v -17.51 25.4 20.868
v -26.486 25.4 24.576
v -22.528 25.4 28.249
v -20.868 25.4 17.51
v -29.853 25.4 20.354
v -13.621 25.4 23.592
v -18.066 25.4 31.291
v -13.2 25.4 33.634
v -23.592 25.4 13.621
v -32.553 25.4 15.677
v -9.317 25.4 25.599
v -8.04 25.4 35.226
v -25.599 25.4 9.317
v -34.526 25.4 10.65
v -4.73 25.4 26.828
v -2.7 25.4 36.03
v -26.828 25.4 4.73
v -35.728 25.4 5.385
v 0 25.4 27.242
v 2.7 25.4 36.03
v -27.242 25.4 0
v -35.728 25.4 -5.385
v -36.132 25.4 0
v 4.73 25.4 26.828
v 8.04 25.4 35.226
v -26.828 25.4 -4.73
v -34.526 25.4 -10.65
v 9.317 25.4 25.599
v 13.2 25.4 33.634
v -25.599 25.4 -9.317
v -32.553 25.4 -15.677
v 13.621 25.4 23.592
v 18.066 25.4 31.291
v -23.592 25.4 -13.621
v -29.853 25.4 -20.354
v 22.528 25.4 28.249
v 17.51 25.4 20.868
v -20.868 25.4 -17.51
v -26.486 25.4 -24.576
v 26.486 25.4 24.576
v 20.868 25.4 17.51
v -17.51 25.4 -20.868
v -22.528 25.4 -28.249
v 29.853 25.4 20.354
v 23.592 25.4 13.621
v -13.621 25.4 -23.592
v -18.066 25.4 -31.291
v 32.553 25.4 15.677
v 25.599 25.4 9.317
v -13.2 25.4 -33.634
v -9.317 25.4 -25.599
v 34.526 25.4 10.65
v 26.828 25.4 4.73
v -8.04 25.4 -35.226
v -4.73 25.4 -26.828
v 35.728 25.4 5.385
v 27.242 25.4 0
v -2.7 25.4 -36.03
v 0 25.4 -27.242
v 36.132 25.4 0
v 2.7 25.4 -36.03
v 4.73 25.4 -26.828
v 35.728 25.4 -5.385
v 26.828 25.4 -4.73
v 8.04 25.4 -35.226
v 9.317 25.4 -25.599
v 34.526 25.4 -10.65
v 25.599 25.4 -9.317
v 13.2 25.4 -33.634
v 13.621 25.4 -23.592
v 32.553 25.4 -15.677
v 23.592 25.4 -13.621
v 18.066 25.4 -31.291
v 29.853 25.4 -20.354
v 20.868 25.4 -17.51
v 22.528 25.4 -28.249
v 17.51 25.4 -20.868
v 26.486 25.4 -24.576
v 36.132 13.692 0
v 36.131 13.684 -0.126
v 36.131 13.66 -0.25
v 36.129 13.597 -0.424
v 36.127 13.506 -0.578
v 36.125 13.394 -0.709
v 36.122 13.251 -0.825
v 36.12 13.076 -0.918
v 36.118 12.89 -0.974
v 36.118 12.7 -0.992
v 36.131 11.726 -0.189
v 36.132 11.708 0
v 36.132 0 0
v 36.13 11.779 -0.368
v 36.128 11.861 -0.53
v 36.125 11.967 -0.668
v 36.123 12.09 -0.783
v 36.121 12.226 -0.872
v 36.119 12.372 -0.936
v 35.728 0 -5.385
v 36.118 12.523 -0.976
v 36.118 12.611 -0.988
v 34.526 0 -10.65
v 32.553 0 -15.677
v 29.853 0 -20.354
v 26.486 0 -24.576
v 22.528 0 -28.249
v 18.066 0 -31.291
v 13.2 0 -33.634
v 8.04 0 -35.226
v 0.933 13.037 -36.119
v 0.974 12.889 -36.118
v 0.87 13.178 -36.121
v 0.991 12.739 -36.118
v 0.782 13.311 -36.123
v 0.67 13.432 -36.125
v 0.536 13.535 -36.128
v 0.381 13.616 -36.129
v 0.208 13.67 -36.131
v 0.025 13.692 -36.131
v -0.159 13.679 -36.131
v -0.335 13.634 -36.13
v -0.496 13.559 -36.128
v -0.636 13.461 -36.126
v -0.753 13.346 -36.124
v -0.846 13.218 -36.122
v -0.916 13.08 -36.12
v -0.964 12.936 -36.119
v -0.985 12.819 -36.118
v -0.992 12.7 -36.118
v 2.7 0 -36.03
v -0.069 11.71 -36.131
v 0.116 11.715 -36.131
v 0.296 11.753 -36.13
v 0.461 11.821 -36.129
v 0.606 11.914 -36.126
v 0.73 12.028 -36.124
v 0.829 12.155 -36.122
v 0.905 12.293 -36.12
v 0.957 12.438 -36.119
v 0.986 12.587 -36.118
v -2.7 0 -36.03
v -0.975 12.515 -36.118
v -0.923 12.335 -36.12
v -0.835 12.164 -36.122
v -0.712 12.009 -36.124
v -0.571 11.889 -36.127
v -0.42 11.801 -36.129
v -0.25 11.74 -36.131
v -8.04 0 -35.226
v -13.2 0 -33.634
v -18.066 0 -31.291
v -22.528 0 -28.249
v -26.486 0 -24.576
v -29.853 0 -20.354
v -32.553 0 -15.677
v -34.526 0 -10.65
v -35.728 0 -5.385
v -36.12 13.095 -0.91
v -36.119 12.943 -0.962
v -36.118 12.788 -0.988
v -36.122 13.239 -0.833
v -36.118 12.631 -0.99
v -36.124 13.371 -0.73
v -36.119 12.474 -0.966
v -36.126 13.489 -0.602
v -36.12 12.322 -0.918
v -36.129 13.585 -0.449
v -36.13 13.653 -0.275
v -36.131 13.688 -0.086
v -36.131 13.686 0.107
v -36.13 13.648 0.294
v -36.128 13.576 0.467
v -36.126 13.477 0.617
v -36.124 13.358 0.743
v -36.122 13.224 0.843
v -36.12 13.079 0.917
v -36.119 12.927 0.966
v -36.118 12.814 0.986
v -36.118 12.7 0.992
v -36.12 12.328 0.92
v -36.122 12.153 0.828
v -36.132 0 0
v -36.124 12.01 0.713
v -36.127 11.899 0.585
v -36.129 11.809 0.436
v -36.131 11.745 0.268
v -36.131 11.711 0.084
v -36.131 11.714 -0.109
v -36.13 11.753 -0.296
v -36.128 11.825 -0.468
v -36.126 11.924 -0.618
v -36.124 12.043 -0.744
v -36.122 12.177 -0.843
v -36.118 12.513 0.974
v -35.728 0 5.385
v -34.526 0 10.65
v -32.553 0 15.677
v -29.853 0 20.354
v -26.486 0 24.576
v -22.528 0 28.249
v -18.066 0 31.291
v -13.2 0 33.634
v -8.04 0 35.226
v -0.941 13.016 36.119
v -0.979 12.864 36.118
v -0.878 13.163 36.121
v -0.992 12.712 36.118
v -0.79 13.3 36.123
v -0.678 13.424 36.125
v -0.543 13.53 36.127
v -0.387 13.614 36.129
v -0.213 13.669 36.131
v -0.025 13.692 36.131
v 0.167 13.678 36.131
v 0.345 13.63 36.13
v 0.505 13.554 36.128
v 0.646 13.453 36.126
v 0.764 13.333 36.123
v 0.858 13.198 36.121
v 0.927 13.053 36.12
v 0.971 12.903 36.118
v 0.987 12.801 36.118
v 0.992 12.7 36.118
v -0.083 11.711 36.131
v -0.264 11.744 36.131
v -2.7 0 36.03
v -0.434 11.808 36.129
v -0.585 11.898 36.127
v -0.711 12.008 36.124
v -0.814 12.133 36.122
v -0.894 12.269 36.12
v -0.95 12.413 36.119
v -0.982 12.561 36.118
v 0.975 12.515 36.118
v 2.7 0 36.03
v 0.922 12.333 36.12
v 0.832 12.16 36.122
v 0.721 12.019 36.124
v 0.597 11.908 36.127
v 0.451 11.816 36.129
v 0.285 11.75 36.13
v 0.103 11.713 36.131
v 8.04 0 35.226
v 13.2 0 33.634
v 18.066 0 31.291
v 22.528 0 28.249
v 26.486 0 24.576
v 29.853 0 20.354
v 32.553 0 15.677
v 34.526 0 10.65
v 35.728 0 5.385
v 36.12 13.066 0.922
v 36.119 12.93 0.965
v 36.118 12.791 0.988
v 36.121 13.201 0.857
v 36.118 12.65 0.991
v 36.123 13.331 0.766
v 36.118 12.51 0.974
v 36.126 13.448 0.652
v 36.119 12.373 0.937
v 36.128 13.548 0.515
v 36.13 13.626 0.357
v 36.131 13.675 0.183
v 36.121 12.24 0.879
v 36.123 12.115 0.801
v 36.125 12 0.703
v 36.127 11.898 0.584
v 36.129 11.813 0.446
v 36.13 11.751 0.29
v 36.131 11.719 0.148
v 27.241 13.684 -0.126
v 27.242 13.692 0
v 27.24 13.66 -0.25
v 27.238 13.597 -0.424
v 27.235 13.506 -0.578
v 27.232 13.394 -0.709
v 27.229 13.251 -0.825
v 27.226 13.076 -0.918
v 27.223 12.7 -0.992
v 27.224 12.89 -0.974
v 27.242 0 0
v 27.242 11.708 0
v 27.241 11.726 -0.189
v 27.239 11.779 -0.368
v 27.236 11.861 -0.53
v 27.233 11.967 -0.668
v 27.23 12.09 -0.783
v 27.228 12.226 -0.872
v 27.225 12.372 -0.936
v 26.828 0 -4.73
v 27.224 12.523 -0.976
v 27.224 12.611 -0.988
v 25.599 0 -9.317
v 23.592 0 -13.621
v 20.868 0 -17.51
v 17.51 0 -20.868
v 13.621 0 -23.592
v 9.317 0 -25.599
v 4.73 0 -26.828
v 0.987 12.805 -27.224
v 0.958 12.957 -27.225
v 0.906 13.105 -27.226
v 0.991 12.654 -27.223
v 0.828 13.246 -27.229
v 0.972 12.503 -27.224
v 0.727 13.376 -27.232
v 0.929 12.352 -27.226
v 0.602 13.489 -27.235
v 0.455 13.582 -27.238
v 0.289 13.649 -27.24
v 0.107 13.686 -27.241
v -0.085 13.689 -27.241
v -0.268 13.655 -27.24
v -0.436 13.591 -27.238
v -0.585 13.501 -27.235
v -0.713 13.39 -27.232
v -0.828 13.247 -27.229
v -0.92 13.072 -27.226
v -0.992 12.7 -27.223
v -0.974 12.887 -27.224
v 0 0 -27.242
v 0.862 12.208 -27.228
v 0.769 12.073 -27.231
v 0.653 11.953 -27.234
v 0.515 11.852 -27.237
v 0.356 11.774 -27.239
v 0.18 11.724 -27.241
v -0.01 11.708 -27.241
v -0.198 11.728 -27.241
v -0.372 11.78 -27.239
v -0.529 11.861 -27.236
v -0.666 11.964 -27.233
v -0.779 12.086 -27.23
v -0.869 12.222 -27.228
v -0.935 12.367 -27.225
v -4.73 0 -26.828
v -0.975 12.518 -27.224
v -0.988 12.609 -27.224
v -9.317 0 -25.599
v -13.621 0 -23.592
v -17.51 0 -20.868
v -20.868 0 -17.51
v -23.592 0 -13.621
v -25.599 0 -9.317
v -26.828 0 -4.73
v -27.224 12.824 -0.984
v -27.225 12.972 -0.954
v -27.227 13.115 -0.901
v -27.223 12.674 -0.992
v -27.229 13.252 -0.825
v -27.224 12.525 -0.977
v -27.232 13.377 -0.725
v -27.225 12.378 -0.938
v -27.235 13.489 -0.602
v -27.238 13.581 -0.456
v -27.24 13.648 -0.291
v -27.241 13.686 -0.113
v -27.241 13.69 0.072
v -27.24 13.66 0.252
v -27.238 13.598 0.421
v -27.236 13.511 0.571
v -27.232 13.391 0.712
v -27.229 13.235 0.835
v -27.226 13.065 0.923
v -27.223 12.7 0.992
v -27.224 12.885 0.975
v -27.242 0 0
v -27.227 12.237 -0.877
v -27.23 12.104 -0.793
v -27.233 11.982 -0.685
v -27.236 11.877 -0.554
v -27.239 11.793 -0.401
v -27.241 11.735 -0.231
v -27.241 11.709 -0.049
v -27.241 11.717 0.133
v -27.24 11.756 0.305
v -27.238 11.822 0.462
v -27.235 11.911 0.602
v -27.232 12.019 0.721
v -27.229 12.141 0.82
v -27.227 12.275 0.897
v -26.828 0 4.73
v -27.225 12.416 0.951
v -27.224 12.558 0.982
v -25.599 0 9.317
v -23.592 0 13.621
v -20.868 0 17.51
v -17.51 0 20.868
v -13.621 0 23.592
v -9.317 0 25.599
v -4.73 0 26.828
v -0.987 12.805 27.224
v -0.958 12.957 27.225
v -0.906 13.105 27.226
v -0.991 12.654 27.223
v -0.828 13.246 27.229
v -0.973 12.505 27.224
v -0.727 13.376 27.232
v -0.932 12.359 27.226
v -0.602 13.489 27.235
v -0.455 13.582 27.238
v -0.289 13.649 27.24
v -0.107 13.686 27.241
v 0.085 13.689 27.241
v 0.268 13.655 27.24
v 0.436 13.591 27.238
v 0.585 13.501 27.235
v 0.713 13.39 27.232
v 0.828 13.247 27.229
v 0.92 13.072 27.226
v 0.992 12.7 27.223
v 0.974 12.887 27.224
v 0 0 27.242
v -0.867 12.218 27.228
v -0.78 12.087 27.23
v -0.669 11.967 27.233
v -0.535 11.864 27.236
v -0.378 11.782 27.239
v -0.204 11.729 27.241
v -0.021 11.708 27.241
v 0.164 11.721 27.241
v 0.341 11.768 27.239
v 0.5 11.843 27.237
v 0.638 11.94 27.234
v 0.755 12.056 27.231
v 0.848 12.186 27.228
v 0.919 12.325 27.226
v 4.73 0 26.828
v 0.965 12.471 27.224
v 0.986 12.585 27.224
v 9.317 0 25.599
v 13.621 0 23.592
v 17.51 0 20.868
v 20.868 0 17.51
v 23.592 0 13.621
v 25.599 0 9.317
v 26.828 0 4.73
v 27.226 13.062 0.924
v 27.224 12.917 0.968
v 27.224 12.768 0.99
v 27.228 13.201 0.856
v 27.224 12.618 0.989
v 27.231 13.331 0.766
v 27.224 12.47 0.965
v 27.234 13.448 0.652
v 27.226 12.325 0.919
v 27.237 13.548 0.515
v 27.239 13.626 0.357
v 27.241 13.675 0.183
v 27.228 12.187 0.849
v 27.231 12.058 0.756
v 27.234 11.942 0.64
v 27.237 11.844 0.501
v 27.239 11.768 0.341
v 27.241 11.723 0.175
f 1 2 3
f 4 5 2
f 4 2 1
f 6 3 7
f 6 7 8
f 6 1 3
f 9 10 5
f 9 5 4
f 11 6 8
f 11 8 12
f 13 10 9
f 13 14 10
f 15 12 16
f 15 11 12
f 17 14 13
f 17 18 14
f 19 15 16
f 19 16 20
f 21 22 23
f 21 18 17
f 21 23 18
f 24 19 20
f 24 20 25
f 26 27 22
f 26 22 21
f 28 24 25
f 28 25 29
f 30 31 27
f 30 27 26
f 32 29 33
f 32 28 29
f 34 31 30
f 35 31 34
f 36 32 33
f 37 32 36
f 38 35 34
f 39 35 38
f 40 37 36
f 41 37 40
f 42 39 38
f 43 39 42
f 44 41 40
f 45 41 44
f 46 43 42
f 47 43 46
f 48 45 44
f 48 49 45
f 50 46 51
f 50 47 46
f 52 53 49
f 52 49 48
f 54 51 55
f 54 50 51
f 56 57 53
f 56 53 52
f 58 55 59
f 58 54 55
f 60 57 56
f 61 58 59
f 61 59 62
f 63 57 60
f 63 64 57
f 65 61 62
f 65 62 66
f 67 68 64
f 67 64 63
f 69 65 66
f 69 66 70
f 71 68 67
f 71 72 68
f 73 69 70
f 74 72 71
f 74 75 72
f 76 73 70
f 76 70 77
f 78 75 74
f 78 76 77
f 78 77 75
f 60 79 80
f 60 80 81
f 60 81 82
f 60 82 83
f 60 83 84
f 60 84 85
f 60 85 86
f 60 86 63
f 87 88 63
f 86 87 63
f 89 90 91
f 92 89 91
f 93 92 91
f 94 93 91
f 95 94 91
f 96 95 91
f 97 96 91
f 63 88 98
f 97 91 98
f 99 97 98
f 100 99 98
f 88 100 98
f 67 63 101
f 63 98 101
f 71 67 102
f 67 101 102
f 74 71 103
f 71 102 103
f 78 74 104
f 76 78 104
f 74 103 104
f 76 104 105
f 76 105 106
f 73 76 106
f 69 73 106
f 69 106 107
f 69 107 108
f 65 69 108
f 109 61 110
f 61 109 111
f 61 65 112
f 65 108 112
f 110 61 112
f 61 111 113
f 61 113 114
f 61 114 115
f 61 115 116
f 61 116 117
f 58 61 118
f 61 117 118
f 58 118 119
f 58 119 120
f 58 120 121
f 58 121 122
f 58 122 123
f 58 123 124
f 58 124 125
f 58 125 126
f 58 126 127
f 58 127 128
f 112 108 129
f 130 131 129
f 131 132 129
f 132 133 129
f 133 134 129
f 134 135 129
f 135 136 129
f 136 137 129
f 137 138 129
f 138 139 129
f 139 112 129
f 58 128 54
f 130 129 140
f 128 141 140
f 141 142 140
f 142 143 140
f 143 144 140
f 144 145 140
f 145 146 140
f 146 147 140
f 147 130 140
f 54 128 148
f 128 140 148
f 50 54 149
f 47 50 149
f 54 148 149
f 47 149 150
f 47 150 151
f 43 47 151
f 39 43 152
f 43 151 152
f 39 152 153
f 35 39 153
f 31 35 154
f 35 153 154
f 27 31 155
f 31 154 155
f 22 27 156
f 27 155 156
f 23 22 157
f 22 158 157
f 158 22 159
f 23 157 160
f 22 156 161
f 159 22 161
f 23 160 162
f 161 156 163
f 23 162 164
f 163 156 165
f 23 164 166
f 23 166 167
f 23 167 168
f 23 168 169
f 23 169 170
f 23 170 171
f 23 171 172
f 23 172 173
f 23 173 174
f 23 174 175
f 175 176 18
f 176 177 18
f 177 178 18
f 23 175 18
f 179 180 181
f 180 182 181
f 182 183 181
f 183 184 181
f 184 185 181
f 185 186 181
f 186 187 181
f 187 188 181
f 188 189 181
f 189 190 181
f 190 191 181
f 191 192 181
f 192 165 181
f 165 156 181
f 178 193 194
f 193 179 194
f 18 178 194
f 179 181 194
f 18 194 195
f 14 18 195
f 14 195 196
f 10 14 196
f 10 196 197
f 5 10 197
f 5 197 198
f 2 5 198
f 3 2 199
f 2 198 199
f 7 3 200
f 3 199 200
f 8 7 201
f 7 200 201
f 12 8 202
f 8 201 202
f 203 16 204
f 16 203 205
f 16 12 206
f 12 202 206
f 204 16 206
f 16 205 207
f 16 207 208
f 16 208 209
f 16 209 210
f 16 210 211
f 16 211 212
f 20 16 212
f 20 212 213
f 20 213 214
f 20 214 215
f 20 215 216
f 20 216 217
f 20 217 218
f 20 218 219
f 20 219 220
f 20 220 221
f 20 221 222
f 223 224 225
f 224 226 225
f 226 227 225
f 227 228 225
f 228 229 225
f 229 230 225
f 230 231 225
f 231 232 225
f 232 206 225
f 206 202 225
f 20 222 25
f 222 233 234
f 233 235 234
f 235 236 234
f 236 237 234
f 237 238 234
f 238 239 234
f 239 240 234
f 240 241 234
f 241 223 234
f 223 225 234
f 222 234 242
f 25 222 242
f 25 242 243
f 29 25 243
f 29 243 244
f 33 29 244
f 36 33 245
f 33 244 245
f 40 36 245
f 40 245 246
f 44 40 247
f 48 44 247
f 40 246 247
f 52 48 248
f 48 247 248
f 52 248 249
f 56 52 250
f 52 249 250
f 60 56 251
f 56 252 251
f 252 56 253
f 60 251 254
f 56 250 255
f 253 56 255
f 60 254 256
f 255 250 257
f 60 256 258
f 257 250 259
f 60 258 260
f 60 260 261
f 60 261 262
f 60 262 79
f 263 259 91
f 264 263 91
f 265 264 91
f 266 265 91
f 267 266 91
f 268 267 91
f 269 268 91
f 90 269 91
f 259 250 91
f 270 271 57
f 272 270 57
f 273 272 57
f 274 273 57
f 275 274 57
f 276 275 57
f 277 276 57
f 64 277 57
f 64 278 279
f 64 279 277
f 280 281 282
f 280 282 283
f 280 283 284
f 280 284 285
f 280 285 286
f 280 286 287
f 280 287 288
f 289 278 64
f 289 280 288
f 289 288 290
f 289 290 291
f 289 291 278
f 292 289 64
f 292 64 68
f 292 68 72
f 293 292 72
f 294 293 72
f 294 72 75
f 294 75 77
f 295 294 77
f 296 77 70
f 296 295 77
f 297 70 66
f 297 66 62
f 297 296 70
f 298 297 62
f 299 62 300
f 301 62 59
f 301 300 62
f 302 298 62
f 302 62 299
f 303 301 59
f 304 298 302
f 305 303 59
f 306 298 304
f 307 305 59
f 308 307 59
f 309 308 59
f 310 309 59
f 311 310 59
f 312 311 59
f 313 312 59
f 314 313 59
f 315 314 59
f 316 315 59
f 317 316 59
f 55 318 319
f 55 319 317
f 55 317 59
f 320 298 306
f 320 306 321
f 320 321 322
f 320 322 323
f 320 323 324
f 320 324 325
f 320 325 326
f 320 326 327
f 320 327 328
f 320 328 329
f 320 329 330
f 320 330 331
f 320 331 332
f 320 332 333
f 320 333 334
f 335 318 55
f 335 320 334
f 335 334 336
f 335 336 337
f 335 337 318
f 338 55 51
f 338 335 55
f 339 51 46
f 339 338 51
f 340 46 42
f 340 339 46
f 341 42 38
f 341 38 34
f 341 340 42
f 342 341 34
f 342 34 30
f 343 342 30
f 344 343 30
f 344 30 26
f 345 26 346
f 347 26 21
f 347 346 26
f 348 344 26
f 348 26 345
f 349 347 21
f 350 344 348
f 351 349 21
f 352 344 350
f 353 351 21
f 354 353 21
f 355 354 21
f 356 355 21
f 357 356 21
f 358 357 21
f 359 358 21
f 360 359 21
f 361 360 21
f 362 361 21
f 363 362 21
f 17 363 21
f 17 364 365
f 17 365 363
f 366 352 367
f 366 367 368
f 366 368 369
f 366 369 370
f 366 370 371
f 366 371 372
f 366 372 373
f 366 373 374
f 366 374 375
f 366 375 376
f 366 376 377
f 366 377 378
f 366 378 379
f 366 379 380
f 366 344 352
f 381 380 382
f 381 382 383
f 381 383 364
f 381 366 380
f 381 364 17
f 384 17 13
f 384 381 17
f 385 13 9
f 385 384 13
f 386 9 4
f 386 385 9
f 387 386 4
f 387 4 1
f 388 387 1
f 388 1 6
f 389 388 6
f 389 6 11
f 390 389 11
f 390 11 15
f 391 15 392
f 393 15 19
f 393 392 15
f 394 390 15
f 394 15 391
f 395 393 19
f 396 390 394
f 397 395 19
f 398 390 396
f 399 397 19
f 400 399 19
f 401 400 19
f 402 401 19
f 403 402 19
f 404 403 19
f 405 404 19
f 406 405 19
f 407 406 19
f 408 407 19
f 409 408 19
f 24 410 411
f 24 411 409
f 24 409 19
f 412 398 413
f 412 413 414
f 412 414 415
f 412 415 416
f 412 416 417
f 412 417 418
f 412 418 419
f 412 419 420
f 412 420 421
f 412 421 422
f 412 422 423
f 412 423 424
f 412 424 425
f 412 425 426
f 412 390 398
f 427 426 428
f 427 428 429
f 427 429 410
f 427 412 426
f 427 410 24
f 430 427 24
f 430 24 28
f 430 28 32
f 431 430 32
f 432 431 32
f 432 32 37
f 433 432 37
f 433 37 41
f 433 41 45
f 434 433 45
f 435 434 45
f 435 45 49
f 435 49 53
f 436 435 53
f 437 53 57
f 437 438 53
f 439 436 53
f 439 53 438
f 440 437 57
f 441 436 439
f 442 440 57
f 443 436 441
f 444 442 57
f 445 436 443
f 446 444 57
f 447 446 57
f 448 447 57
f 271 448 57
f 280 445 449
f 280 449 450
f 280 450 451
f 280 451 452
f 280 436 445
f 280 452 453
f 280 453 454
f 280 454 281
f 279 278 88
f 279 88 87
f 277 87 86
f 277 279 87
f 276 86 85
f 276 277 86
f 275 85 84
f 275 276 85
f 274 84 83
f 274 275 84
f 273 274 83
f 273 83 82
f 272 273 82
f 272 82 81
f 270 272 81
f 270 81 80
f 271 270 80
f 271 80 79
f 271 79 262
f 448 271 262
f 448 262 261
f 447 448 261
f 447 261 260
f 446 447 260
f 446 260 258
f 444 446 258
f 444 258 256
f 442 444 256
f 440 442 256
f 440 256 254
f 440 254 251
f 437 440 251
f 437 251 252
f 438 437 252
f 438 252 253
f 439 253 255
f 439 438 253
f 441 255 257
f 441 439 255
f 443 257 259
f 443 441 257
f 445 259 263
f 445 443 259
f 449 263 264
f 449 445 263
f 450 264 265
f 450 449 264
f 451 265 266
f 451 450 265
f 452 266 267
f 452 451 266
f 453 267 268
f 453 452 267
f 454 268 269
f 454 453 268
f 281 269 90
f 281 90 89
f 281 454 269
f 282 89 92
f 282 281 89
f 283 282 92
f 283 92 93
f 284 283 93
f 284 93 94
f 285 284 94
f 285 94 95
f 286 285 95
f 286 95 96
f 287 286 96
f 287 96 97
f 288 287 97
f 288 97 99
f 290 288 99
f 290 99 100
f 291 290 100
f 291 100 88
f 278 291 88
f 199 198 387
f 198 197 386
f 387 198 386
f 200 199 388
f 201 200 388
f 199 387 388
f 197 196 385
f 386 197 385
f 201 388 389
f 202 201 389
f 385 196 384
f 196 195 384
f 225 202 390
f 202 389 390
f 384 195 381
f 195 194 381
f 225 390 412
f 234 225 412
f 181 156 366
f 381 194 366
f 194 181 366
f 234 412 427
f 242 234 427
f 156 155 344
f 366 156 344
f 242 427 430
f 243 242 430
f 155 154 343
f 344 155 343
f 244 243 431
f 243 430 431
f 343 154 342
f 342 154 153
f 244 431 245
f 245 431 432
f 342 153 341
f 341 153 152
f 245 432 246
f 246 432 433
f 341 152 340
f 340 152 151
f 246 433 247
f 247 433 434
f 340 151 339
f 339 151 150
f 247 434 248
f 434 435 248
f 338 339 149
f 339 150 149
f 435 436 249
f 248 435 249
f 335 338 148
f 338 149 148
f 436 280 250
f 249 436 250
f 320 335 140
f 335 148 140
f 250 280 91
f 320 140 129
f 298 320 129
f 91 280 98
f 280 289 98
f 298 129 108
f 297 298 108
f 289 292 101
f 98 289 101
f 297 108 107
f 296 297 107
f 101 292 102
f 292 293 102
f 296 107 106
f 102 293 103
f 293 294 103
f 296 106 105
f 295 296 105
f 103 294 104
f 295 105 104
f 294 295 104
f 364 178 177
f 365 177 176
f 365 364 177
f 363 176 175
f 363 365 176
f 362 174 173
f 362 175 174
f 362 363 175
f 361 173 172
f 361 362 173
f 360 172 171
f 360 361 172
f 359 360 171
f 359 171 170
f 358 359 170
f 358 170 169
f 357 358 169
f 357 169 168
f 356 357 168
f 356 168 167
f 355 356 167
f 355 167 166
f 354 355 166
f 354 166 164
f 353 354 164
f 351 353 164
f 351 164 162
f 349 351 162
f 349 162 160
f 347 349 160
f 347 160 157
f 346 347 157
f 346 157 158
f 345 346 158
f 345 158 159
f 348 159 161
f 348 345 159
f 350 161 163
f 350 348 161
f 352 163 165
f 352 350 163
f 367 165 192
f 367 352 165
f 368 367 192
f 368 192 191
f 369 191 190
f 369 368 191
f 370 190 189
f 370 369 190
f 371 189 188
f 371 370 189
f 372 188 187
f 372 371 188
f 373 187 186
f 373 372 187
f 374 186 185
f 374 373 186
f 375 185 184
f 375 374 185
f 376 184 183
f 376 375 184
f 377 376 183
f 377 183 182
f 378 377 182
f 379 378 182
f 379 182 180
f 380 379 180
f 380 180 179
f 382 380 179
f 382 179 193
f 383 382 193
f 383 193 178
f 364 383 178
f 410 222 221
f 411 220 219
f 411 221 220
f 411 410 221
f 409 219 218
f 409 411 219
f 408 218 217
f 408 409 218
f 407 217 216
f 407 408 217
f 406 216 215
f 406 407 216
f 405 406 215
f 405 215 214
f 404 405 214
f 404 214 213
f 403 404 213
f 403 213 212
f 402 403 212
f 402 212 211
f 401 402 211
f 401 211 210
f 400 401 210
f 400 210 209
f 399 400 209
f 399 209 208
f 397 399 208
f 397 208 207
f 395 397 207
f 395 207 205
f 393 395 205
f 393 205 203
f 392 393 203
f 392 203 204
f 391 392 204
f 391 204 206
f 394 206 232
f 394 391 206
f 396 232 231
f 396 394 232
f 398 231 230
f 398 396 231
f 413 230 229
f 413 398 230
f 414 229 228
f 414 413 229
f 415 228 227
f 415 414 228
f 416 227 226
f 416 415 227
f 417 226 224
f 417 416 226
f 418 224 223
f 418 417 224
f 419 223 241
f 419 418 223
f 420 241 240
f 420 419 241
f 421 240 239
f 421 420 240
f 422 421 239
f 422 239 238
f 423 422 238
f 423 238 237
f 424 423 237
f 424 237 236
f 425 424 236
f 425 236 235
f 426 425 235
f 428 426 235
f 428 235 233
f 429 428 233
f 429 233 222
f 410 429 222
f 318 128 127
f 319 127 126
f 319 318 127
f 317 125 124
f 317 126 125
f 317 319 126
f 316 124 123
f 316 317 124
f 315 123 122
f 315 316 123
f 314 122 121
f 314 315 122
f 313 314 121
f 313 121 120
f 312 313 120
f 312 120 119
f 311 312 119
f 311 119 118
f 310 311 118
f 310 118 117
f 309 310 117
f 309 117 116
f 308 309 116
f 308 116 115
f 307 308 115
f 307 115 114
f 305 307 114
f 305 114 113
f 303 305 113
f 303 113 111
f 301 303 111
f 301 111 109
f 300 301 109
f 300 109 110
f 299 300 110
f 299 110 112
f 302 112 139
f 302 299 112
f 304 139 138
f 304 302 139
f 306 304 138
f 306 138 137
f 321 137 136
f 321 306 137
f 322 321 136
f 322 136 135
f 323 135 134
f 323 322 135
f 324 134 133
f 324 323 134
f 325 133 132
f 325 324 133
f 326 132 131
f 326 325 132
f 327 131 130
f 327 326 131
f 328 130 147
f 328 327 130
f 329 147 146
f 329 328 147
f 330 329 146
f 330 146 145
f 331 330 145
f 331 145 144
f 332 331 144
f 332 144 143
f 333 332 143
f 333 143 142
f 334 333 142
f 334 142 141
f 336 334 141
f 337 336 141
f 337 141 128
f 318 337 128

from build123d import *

# Parameters (mm, degrees)
SKETCH1_R           = 36.1315
SKETCH1_R_2         = 27.2415
BOSS_EXTRUDE1_DEPTH = 25.4
CUT_EXTRUDE1_START  = -8.908075
SKETCH2_R           = 0.9921875
CUT_EXTRUDE1_DEPTH  = 8.908075
CIRPATTERN1_COUNT   = 4


with BuildPart() as part:
    # Sketch1 → Boss-Extrude1 (new body)
    with BuildSketch(Plane(origin=(0, 0, 0), x_dir=(1, 0, 0), z_dir=(0, 1, 0))):
        Circle(SKETCH1_R)
        Circle(SKETCH1_R_2, mode=Mode.SUBTRACT)
    extrude(amount=BOSS_EXTRUDE1_DEPTH)

    # Sketch2 → Cut-Extrude1 (cut)
    with BuildSketch(Plane.XY.offset(36.1315).offset(CUT_EXTRUDE1_START)):
        with Locations((0, 12.7)):
            Circle(SKETCH2_R)
    cut_extrude1 = extrude(amount=CUT_EXTRUDE1_DEPTH, mode=Mode.SUBTRACT)

    # CirPattern1: Cut-Extrude1 ×4 about axis
    cirpattern1_axis = Axis((0, 25.4, 0), (0, -1, 0))
    for i in range(1, CIRPATTERN1_COUNT):
        add(cut_extrude1.rotate(cirpattern1_axis, i * 360 / CIRPATTERN1_COUNT), mode=Mode.SUBTRACT)


solid = part.part
